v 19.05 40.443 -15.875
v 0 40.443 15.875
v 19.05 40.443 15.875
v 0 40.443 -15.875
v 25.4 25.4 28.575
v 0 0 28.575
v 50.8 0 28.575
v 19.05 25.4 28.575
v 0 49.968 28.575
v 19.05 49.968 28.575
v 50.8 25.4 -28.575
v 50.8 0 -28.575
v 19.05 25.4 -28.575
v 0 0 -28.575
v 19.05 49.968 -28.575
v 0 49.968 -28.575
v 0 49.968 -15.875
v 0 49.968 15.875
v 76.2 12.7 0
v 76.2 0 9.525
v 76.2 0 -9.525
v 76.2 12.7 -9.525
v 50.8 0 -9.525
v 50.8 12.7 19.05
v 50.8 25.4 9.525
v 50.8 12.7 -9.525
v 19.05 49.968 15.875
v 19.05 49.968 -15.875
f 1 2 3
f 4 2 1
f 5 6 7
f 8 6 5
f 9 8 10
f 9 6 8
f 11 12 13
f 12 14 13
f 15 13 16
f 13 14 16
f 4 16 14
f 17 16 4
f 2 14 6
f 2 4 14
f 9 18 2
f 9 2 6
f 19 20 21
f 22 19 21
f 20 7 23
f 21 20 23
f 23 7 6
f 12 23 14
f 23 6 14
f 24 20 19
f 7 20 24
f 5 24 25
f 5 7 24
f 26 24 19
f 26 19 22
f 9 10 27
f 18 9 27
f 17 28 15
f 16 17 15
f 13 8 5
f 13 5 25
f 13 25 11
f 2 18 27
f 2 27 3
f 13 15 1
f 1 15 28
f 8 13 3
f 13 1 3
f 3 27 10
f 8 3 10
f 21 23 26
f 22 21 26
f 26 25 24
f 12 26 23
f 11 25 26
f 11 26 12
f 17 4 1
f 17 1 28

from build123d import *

# Parameters (mm, degrees)
BOSS_EXTRUDE1_DEPTH = 19.05
SKETCH2_W           = 57.15
SKETCH2_H           = 25.4
BOSS_EXTRUDE2_DEPTH = 31.75
SKETCH6_W           = 38.1
SKETCH6_H           = 12.7
BOSS_EXTRUDE3_DEPTH = 25.4
CUT_EXTRUDE1_START  = -18
CUT_EXTRUDE1_DEPTH  = 33.875


with BuildPart() as part:
    # Sketch1 → Boss-Extrude1 (new body)
    with BuildSketch(Plane(origin=(0, 0, 0), x_dir=(0, 0, -1), z_dir=(1, 0, 0))):
        Polygon((-15.875, 40.443322581), (15.875, 40.443322581), (15.875, 49.968322581), (28.575, 49.968322581), (28.575, 0), (-28.575, 0), (-28.575, 49.968322581), (-15.875, 49.968322581), align=None)
    extrude(amount=BOSS_EXTRUDE1_DEPTH)

    # Sketch2 → Boss-Extrude2 (add)
    with BuildSketch(Plane(origin=(19.05, 0, 0), x_dir=(0, 0, -1), z_dir=(1, 0, 0))):
        with Locations((0, 12.7)):
            Rectangle(SKETCH2_W, SKETCH2_H)
    extrude(amount=BOSS_EXTRUDE2_DEPTH)

    # Sketch6 → Boss-Extrude3 (add)
    with BuildSketch(Plane(origin=(50.8, 0, 0), x_dir=(0, 0, -1), z_dir=(1, 0, 0))):
        with Locations((-9.525, 6.35)):
            Rectangle(SKETCH6_W, SKETCH6_H)
    extrude(amount=BOSS_EXTRUDE3_DEPTH)

    # Cut-Extrude1: read off the stored shape, not the designer's step
    # Cut-Extrude1 outline → Cut-Extrude1 (cut)
    with BuildSketch(Plane(origin=(0, 0, 0), x_dir=(1, 0, 0), z_dir=(0, 0.7999999999999996, -0.6000000000000005)).offset(CUT_EXTRUDE1_START)):
        Polygon((24, -38.94), (24, -40), (76.2, -40), (76.2, -7.62), align=None)
    extrude(amount=CUT_EXTRUDE1_DEPTH, mode=Mode.SUBTRACT)


solid = part.part
